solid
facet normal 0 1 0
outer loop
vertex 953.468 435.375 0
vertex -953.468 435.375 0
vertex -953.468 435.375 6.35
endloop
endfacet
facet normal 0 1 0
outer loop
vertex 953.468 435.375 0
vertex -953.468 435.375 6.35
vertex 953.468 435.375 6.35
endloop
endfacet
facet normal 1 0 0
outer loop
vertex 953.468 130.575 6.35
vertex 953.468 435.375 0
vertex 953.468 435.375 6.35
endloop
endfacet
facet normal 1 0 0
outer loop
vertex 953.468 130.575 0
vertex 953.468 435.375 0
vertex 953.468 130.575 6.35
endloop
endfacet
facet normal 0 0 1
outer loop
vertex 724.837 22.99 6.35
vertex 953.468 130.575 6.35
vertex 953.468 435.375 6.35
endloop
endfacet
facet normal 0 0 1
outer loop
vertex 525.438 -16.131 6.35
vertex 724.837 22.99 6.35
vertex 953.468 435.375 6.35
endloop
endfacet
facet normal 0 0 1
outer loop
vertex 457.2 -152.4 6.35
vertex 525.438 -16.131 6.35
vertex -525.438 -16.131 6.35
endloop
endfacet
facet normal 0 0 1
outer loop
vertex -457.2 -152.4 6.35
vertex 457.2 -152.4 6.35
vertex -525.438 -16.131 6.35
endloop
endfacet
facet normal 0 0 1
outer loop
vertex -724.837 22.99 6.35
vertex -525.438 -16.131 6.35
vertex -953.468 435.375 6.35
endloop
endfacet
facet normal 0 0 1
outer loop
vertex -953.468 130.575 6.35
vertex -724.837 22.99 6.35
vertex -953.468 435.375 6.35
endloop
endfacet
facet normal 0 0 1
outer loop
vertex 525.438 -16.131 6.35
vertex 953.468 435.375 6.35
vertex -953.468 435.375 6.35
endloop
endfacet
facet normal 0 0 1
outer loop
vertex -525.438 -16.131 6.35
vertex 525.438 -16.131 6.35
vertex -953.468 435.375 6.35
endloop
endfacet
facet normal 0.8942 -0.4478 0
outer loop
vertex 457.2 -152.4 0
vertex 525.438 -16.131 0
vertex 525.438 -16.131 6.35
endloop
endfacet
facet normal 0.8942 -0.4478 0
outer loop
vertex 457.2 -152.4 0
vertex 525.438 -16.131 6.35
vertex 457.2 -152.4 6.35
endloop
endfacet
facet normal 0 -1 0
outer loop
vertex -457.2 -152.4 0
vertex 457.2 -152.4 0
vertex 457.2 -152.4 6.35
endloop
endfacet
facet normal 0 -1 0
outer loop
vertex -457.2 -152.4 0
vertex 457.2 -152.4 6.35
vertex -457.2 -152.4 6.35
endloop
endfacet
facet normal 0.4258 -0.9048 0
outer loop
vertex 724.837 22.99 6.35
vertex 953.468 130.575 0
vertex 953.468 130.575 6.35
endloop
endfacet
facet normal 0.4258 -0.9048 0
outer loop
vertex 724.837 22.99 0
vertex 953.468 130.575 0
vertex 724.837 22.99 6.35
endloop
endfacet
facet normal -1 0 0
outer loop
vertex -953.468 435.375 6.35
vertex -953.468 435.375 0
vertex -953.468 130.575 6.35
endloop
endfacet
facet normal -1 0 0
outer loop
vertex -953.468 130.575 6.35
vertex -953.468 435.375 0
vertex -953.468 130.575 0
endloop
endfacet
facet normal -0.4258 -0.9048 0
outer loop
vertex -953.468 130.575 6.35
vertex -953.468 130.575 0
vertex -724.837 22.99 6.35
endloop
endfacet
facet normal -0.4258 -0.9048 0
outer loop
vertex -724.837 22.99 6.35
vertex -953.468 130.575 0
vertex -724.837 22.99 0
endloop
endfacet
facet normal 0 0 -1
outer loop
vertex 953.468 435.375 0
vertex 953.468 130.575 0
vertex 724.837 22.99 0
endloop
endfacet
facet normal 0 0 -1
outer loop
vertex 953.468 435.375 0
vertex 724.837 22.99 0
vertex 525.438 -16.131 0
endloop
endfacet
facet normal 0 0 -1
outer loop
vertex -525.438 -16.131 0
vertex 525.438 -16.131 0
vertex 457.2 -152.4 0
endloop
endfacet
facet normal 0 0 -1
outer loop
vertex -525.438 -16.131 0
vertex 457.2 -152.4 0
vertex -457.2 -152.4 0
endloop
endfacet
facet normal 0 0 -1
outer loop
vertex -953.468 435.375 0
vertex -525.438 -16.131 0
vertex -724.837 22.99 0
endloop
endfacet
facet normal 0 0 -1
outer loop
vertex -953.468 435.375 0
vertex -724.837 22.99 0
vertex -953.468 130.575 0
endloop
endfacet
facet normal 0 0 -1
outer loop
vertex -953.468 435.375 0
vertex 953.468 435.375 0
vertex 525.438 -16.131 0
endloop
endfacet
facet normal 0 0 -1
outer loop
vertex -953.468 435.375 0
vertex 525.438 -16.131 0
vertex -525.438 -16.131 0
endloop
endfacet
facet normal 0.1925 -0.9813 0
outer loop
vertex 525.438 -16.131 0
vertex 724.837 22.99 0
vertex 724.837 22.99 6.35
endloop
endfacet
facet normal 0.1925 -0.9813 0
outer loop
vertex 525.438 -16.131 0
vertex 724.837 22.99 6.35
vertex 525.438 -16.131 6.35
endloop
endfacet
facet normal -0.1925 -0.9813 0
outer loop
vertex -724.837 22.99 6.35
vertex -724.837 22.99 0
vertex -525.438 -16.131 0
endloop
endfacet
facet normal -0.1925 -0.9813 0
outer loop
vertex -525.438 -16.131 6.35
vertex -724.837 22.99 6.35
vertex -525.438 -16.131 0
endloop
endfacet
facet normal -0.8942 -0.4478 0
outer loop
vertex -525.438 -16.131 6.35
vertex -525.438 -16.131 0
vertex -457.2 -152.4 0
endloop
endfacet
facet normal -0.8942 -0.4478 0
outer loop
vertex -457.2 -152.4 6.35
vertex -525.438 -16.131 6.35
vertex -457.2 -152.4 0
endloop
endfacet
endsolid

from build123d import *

# Parameters (mm, degrees)
F1_DEPTH = 6.35


with BuildPart() as f1:
    # F0 (on Top) → F1 (new body)
    with BuildSketch(Plane.XY):
        Polygon((-525.438485, -16.130894), (-457.2, -152.4), (0, -152.4), (0, 435.37514), (-953.46813, 435.37514), (-953.46813, 130.57514), (-724.837154, 22.989569), align=None)
    extrude(amount=F1_DEPTH)

    # F2: F1 across plane


with BuildPart() as f1_1:
    add(f1.part)
    add(f1.part.mirror(Plane.YZ))


solid = f1_1.part
